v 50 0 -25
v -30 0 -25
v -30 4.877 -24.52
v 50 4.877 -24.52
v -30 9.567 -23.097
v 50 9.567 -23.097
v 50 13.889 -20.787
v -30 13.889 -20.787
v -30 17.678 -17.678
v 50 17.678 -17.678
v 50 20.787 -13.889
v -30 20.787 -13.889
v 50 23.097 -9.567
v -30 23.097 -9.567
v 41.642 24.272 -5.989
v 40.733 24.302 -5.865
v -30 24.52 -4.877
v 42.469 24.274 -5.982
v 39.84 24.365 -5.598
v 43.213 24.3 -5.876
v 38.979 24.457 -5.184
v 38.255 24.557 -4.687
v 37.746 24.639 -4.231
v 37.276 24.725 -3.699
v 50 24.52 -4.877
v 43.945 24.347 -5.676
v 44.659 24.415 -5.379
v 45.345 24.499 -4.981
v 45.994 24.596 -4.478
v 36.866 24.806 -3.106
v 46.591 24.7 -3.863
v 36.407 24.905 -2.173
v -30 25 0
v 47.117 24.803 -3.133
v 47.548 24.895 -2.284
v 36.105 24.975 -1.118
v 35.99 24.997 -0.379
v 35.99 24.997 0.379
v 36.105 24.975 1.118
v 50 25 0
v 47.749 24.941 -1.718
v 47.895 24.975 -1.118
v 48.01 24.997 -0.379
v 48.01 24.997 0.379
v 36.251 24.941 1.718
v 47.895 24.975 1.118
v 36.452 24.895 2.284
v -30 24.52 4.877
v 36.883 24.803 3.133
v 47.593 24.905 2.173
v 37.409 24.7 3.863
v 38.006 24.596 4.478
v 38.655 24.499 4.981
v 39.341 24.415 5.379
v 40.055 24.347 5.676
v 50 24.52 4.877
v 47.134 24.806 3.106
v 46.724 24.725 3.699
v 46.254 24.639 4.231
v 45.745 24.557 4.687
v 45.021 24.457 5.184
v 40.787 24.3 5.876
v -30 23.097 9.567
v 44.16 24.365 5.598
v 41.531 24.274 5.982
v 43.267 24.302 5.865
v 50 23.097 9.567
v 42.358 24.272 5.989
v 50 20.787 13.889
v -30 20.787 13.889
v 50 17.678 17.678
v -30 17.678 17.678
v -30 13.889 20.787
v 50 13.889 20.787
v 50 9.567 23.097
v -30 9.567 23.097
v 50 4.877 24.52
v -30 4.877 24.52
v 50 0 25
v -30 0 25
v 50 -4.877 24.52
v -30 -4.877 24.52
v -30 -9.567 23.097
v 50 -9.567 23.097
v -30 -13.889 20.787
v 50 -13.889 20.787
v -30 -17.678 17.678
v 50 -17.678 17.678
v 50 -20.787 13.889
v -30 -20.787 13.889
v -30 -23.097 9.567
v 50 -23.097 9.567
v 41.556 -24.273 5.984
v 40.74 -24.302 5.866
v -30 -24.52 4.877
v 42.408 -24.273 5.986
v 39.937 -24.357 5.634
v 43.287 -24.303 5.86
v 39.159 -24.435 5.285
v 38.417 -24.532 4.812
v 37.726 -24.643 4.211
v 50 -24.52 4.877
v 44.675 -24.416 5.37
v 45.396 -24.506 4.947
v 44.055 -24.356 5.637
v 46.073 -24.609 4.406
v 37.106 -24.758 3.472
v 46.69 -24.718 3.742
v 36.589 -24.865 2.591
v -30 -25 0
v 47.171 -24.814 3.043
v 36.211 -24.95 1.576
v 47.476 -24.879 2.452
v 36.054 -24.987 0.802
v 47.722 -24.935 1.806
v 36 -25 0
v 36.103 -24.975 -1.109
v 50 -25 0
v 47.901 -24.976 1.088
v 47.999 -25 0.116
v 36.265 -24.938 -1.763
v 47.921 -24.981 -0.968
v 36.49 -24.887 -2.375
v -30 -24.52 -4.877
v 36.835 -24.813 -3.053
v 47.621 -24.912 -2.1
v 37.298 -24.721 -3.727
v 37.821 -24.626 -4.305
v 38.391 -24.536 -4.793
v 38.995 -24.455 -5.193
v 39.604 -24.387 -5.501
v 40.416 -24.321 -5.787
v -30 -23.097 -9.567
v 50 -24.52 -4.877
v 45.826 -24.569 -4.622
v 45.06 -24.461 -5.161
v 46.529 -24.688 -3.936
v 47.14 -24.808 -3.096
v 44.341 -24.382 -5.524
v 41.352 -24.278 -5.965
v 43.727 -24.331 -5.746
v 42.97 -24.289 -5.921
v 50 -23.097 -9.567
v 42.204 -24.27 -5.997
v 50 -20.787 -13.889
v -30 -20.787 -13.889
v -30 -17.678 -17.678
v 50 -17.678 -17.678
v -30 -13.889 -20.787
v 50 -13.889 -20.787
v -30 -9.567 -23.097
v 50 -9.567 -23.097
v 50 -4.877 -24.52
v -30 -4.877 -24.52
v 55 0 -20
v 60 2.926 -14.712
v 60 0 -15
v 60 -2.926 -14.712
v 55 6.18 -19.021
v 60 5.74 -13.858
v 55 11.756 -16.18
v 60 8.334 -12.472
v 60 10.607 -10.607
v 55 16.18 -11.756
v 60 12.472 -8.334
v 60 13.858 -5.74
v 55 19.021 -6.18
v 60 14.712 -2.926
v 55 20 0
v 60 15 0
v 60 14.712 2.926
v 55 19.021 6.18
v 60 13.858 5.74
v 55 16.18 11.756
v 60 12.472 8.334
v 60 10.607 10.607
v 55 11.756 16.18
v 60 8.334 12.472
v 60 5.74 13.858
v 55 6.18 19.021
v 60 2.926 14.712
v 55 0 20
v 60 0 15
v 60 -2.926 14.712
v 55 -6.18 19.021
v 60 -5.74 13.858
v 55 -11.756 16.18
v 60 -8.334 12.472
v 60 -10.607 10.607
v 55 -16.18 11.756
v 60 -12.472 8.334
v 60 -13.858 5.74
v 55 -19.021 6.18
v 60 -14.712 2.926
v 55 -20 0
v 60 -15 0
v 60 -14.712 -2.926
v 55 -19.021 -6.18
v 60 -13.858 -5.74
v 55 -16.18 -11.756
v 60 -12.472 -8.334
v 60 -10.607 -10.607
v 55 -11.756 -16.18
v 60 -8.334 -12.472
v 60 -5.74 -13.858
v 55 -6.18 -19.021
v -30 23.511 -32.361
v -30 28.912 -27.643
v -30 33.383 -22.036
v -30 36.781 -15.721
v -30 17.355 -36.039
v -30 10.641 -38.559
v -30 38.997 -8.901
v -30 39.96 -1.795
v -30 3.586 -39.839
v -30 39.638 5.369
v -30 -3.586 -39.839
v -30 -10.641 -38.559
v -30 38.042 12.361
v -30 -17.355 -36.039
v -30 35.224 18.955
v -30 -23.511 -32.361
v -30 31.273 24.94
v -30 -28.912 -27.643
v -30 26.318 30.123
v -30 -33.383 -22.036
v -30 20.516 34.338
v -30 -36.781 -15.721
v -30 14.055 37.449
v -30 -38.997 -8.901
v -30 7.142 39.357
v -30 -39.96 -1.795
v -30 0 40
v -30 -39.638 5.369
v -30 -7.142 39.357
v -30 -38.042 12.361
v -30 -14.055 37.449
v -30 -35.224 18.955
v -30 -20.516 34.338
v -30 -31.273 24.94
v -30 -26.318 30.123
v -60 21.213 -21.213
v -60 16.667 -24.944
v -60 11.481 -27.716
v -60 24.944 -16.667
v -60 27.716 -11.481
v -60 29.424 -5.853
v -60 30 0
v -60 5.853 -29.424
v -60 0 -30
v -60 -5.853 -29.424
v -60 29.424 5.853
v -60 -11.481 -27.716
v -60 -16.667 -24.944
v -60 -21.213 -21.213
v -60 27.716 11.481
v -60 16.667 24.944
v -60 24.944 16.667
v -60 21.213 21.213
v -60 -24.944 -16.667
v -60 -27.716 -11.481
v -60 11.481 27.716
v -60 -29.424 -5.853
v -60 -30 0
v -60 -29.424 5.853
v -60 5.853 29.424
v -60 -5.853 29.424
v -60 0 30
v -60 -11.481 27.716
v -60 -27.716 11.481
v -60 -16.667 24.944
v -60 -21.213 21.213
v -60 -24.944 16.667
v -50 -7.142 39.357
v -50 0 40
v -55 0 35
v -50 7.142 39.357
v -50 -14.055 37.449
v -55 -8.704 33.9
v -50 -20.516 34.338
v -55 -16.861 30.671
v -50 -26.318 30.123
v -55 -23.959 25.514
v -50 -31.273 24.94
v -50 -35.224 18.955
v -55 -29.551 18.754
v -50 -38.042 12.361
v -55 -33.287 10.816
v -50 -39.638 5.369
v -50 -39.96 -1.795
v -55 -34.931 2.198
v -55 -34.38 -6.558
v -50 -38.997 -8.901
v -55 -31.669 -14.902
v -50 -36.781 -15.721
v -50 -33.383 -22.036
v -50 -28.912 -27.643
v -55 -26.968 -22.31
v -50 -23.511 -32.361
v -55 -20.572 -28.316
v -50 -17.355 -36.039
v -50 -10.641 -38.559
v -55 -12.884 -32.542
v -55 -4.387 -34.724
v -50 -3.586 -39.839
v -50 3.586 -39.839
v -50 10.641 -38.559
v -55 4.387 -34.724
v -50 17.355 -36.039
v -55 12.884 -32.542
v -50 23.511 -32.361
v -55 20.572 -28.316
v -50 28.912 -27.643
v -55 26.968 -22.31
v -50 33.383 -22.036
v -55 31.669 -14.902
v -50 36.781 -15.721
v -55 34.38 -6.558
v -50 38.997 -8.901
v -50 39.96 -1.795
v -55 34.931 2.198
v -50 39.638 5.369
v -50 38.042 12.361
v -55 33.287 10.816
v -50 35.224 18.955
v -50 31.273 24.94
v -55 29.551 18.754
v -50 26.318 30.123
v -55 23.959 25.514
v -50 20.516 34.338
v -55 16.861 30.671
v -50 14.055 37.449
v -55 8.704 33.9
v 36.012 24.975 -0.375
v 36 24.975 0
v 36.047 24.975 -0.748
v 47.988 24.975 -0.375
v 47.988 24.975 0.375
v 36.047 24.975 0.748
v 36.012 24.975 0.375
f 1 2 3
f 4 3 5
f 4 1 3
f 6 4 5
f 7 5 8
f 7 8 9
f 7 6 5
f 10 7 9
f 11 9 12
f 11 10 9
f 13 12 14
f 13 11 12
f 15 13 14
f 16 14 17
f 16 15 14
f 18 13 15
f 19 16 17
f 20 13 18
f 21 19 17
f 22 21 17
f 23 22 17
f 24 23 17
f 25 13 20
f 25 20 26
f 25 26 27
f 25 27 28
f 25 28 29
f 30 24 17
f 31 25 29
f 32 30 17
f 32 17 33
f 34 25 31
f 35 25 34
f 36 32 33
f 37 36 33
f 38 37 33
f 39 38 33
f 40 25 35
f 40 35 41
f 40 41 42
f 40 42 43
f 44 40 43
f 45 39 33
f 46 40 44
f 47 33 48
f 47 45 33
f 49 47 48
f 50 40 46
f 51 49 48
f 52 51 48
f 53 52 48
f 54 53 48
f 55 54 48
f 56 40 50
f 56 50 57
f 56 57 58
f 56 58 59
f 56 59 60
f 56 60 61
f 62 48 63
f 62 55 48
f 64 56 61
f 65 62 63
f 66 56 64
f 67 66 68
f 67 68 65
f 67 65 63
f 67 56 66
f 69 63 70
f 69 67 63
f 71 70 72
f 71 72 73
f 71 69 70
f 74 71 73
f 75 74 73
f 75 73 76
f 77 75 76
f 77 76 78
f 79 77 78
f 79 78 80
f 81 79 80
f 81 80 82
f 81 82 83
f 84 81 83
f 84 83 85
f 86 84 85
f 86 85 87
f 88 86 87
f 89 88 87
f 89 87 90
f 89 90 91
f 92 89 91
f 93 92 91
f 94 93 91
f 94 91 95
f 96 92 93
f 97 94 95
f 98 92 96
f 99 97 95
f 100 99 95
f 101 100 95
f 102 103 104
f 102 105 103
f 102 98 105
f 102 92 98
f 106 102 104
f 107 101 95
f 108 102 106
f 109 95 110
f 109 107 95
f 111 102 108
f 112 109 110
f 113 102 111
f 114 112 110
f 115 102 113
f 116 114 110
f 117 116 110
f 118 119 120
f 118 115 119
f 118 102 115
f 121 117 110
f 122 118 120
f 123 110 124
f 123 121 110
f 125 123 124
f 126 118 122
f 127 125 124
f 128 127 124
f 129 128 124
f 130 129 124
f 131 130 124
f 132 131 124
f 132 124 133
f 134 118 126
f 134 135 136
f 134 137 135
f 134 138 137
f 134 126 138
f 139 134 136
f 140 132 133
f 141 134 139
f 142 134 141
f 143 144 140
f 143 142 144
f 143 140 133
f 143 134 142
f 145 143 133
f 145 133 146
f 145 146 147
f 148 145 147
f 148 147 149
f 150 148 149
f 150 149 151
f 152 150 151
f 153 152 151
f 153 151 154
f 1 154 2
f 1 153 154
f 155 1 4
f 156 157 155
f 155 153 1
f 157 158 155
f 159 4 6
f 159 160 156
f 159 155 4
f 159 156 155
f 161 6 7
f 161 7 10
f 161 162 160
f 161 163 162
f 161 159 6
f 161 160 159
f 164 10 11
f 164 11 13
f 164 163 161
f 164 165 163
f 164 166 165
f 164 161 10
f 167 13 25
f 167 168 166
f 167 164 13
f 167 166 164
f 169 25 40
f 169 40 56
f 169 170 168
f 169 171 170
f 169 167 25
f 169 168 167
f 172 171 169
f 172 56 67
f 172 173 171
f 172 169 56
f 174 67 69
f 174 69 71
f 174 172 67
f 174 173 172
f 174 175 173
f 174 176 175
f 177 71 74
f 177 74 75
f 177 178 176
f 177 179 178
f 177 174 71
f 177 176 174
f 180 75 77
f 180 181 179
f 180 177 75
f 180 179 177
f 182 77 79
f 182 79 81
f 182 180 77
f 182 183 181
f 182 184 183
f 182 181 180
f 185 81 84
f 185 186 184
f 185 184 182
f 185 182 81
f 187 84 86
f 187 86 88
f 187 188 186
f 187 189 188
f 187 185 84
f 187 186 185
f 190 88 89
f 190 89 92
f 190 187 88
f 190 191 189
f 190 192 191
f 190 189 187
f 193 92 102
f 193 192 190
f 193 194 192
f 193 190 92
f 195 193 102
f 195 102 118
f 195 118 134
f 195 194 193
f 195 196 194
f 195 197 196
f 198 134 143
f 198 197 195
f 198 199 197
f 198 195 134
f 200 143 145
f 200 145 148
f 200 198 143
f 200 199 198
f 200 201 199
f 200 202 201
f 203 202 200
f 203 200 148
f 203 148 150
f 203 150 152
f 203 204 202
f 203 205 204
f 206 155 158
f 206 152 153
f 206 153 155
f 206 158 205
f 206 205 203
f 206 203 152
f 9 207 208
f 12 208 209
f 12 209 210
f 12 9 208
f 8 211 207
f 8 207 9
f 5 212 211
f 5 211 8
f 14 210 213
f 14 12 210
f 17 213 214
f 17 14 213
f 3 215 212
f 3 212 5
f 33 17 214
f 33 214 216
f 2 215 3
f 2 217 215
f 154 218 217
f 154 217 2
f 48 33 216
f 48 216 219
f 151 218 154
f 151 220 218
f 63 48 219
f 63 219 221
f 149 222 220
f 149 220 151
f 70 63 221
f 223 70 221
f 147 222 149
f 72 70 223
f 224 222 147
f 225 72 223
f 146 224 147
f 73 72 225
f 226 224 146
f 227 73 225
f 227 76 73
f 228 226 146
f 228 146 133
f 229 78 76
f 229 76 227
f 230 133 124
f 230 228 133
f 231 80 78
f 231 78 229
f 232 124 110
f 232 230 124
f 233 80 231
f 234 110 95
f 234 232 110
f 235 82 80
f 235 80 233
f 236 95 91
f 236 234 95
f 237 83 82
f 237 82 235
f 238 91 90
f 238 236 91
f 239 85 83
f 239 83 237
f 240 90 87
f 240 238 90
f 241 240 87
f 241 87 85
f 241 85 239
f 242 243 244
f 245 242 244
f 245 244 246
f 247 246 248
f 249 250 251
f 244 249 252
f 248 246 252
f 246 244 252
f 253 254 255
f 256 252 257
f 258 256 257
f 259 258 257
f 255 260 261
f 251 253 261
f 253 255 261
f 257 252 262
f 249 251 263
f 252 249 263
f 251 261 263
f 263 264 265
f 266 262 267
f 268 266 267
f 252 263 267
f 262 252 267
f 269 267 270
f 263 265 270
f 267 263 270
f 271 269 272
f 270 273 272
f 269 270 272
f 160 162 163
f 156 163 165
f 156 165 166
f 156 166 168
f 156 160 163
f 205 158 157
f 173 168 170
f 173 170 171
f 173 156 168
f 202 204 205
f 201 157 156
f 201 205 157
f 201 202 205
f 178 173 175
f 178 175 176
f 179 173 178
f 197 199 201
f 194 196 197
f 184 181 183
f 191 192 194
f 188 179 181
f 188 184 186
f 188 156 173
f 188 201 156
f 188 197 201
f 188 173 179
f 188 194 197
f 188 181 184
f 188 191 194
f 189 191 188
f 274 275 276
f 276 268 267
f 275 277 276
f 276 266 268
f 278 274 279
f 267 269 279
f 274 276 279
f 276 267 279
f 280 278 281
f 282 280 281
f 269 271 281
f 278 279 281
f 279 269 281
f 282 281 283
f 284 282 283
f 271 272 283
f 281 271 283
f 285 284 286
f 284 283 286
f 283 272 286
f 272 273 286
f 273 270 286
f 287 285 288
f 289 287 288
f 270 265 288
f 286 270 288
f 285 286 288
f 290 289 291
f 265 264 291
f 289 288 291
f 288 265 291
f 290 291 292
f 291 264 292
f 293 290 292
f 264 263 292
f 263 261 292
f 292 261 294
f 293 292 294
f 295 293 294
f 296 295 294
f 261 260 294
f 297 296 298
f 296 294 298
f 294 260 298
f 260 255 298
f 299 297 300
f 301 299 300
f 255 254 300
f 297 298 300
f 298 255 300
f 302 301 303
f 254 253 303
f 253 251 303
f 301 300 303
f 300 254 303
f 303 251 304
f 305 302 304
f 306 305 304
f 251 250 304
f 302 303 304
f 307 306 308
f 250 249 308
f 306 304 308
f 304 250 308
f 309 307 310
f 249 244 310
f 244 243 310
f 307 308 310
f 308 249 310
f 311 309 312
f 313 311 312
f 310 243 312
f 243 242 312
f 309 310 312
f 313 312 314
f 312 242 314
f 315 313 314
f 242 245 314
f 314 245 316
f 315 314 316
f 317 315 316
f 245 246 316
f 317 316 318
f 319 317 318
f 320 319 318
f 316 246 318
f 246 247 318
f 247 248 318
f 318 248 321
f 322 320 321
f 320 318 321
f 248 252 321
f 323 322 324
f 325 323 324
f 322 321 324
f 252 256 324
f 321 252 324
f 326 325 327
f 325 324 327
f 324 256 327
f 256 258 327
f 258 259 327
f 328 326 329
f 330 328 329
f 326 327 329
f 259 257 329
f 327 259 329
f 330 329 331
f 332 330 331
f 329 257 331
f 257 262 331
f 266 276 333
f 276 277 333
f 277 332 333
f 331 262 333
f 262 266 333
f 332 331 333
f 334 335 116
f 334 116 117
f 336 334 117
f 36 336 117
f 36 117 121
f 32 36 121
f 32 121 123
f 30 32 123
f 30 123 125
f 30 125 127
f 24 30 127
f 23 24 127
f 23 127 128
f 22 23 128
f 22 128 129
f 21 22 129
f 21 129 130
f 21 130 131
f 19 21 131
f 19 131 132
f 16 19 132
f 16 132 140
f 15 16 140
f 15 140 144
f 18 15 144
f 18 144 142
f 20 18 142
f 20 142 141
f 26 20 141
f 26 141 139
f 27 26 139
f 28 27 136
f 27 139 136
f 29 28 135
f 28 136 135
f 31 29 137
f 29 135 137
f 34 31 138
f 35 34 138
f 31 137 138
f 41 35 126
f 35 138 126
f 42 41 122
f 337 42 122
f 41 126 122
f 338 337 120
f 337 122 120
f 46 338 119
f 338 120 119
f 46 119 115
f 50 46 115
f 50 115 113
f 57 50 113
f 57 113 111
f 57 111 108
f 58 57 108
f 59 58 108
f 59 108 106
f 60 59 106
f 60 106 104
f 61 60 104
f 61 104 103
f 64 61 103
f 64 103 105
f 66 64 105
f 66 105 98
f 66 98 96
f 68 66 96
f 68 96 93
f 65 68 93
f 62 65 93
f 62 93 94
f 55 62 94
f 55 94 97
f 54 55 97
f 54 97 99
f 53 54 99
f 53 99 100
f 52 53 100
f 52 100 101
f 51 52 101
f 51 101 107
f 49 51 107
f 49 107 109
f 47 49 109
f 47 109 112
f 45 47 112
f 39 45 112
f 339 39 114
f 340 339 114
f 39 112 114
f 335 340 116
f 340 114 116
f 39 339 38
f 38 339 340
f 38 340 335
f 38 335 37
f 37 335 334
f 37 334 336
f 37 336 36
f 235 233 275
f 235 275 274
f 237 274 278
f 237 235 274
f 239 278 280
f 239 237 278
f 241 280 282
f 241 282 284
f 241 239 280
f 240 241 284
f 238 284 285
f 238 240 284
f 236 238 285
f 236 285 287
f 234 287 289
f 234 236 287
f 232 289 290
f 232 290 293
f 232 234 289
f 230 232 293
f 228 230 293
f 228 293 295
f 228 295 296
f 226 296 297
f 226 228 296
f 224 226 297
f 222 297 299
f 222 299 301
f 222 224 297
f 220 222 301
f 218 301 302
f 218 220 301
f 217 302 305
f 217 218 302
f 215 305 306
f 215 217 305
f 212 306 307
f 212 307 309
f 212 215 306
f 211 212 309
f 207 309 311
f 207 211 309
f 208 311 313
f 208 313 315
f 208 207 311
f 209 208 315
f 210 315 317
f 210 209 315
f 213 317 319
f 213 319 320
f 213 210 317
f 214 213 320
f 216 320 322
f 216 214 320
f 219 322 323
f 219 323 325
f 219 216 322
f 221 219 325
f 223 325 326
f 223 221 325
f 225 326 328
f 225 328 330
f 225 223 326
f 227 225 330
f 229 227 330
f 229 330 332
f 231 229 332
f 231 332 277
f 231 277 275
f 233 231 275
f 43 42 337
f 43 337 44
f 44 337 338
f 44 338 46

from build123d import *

# Parameters (mm, degrees)
SKETCH2_R                            = 40
BOSS_EXTRUDE1_DEPTH                  = 60
SKETCH3_R                            = 40
SKETCH3_R_2                          = 25
CUT_EXTRUDE1_DEPTH                   = 90
CHAMFER1_SIZE                        = 10
F_12_0_12_DIAMETER_HOLE1_D           = 12
F_12_0_12_DIAMETER_HOLE1_CSINK_D     = 12.05
F_12_0_12_DIAMETER_HOLE1_CSINK_ANGLE = 90


with BuildPart() as part:
    # Sketch2 → Boss-Extrude1 (new, symmetric)
    with BuildSketch(Plane.YZ):
        with Locations(Location((0, 0, 0), (0, 0, 90))):
            Circle(SKETCH2_R)
    extrude(amount=BOSS_EXTRUDE1_DEPTH, both=True)

    # Sketch3 → Cut-Extrude1 (cut)
    with BuildSketch(Plane.YZ.offset(60)):
        with Locations(Location((0, 0, 0), (0, 0, 90))):
            Circle(SKETCH3_R)
        with Locations(Location((0, 0, 0), (0, 0, 270))):
            Circle(SKETCH3_R_2, mode=Mode.SUBTRACT)
    extrude(amount=-CUT_EXTRUDE1_DEPTH, mode=Mode.SUBTRACT)

    # Chamfer1
    chamfer1_edges = [part.edges().sort_by_distance(p)[0] for p in [
        (-60, 0, -40),
        (60, 0, 25),
    ]]
    chamfer(chamfer1_edges, length=CHAMFER1_SIZE)

    # Ø12.0 (12) Diameter Hole1 (through all)
    with Locations(Plane(origin=(0, 25, 0), x_dir=(1, 0, 0), z_dir=(0, 1, 0))):
        with Locations((42, 0)):
            CounterSinkHole(F_12_0_12_DIAMETER_HOLE1_D / 2, F_12_0_12_DIAMETER_HOLE1_CSINK_D / 2, counter_sink_angle=F_12_0_12_DIAMETER_HOLE1_CSINK_ANGLE)


solid = part.part
